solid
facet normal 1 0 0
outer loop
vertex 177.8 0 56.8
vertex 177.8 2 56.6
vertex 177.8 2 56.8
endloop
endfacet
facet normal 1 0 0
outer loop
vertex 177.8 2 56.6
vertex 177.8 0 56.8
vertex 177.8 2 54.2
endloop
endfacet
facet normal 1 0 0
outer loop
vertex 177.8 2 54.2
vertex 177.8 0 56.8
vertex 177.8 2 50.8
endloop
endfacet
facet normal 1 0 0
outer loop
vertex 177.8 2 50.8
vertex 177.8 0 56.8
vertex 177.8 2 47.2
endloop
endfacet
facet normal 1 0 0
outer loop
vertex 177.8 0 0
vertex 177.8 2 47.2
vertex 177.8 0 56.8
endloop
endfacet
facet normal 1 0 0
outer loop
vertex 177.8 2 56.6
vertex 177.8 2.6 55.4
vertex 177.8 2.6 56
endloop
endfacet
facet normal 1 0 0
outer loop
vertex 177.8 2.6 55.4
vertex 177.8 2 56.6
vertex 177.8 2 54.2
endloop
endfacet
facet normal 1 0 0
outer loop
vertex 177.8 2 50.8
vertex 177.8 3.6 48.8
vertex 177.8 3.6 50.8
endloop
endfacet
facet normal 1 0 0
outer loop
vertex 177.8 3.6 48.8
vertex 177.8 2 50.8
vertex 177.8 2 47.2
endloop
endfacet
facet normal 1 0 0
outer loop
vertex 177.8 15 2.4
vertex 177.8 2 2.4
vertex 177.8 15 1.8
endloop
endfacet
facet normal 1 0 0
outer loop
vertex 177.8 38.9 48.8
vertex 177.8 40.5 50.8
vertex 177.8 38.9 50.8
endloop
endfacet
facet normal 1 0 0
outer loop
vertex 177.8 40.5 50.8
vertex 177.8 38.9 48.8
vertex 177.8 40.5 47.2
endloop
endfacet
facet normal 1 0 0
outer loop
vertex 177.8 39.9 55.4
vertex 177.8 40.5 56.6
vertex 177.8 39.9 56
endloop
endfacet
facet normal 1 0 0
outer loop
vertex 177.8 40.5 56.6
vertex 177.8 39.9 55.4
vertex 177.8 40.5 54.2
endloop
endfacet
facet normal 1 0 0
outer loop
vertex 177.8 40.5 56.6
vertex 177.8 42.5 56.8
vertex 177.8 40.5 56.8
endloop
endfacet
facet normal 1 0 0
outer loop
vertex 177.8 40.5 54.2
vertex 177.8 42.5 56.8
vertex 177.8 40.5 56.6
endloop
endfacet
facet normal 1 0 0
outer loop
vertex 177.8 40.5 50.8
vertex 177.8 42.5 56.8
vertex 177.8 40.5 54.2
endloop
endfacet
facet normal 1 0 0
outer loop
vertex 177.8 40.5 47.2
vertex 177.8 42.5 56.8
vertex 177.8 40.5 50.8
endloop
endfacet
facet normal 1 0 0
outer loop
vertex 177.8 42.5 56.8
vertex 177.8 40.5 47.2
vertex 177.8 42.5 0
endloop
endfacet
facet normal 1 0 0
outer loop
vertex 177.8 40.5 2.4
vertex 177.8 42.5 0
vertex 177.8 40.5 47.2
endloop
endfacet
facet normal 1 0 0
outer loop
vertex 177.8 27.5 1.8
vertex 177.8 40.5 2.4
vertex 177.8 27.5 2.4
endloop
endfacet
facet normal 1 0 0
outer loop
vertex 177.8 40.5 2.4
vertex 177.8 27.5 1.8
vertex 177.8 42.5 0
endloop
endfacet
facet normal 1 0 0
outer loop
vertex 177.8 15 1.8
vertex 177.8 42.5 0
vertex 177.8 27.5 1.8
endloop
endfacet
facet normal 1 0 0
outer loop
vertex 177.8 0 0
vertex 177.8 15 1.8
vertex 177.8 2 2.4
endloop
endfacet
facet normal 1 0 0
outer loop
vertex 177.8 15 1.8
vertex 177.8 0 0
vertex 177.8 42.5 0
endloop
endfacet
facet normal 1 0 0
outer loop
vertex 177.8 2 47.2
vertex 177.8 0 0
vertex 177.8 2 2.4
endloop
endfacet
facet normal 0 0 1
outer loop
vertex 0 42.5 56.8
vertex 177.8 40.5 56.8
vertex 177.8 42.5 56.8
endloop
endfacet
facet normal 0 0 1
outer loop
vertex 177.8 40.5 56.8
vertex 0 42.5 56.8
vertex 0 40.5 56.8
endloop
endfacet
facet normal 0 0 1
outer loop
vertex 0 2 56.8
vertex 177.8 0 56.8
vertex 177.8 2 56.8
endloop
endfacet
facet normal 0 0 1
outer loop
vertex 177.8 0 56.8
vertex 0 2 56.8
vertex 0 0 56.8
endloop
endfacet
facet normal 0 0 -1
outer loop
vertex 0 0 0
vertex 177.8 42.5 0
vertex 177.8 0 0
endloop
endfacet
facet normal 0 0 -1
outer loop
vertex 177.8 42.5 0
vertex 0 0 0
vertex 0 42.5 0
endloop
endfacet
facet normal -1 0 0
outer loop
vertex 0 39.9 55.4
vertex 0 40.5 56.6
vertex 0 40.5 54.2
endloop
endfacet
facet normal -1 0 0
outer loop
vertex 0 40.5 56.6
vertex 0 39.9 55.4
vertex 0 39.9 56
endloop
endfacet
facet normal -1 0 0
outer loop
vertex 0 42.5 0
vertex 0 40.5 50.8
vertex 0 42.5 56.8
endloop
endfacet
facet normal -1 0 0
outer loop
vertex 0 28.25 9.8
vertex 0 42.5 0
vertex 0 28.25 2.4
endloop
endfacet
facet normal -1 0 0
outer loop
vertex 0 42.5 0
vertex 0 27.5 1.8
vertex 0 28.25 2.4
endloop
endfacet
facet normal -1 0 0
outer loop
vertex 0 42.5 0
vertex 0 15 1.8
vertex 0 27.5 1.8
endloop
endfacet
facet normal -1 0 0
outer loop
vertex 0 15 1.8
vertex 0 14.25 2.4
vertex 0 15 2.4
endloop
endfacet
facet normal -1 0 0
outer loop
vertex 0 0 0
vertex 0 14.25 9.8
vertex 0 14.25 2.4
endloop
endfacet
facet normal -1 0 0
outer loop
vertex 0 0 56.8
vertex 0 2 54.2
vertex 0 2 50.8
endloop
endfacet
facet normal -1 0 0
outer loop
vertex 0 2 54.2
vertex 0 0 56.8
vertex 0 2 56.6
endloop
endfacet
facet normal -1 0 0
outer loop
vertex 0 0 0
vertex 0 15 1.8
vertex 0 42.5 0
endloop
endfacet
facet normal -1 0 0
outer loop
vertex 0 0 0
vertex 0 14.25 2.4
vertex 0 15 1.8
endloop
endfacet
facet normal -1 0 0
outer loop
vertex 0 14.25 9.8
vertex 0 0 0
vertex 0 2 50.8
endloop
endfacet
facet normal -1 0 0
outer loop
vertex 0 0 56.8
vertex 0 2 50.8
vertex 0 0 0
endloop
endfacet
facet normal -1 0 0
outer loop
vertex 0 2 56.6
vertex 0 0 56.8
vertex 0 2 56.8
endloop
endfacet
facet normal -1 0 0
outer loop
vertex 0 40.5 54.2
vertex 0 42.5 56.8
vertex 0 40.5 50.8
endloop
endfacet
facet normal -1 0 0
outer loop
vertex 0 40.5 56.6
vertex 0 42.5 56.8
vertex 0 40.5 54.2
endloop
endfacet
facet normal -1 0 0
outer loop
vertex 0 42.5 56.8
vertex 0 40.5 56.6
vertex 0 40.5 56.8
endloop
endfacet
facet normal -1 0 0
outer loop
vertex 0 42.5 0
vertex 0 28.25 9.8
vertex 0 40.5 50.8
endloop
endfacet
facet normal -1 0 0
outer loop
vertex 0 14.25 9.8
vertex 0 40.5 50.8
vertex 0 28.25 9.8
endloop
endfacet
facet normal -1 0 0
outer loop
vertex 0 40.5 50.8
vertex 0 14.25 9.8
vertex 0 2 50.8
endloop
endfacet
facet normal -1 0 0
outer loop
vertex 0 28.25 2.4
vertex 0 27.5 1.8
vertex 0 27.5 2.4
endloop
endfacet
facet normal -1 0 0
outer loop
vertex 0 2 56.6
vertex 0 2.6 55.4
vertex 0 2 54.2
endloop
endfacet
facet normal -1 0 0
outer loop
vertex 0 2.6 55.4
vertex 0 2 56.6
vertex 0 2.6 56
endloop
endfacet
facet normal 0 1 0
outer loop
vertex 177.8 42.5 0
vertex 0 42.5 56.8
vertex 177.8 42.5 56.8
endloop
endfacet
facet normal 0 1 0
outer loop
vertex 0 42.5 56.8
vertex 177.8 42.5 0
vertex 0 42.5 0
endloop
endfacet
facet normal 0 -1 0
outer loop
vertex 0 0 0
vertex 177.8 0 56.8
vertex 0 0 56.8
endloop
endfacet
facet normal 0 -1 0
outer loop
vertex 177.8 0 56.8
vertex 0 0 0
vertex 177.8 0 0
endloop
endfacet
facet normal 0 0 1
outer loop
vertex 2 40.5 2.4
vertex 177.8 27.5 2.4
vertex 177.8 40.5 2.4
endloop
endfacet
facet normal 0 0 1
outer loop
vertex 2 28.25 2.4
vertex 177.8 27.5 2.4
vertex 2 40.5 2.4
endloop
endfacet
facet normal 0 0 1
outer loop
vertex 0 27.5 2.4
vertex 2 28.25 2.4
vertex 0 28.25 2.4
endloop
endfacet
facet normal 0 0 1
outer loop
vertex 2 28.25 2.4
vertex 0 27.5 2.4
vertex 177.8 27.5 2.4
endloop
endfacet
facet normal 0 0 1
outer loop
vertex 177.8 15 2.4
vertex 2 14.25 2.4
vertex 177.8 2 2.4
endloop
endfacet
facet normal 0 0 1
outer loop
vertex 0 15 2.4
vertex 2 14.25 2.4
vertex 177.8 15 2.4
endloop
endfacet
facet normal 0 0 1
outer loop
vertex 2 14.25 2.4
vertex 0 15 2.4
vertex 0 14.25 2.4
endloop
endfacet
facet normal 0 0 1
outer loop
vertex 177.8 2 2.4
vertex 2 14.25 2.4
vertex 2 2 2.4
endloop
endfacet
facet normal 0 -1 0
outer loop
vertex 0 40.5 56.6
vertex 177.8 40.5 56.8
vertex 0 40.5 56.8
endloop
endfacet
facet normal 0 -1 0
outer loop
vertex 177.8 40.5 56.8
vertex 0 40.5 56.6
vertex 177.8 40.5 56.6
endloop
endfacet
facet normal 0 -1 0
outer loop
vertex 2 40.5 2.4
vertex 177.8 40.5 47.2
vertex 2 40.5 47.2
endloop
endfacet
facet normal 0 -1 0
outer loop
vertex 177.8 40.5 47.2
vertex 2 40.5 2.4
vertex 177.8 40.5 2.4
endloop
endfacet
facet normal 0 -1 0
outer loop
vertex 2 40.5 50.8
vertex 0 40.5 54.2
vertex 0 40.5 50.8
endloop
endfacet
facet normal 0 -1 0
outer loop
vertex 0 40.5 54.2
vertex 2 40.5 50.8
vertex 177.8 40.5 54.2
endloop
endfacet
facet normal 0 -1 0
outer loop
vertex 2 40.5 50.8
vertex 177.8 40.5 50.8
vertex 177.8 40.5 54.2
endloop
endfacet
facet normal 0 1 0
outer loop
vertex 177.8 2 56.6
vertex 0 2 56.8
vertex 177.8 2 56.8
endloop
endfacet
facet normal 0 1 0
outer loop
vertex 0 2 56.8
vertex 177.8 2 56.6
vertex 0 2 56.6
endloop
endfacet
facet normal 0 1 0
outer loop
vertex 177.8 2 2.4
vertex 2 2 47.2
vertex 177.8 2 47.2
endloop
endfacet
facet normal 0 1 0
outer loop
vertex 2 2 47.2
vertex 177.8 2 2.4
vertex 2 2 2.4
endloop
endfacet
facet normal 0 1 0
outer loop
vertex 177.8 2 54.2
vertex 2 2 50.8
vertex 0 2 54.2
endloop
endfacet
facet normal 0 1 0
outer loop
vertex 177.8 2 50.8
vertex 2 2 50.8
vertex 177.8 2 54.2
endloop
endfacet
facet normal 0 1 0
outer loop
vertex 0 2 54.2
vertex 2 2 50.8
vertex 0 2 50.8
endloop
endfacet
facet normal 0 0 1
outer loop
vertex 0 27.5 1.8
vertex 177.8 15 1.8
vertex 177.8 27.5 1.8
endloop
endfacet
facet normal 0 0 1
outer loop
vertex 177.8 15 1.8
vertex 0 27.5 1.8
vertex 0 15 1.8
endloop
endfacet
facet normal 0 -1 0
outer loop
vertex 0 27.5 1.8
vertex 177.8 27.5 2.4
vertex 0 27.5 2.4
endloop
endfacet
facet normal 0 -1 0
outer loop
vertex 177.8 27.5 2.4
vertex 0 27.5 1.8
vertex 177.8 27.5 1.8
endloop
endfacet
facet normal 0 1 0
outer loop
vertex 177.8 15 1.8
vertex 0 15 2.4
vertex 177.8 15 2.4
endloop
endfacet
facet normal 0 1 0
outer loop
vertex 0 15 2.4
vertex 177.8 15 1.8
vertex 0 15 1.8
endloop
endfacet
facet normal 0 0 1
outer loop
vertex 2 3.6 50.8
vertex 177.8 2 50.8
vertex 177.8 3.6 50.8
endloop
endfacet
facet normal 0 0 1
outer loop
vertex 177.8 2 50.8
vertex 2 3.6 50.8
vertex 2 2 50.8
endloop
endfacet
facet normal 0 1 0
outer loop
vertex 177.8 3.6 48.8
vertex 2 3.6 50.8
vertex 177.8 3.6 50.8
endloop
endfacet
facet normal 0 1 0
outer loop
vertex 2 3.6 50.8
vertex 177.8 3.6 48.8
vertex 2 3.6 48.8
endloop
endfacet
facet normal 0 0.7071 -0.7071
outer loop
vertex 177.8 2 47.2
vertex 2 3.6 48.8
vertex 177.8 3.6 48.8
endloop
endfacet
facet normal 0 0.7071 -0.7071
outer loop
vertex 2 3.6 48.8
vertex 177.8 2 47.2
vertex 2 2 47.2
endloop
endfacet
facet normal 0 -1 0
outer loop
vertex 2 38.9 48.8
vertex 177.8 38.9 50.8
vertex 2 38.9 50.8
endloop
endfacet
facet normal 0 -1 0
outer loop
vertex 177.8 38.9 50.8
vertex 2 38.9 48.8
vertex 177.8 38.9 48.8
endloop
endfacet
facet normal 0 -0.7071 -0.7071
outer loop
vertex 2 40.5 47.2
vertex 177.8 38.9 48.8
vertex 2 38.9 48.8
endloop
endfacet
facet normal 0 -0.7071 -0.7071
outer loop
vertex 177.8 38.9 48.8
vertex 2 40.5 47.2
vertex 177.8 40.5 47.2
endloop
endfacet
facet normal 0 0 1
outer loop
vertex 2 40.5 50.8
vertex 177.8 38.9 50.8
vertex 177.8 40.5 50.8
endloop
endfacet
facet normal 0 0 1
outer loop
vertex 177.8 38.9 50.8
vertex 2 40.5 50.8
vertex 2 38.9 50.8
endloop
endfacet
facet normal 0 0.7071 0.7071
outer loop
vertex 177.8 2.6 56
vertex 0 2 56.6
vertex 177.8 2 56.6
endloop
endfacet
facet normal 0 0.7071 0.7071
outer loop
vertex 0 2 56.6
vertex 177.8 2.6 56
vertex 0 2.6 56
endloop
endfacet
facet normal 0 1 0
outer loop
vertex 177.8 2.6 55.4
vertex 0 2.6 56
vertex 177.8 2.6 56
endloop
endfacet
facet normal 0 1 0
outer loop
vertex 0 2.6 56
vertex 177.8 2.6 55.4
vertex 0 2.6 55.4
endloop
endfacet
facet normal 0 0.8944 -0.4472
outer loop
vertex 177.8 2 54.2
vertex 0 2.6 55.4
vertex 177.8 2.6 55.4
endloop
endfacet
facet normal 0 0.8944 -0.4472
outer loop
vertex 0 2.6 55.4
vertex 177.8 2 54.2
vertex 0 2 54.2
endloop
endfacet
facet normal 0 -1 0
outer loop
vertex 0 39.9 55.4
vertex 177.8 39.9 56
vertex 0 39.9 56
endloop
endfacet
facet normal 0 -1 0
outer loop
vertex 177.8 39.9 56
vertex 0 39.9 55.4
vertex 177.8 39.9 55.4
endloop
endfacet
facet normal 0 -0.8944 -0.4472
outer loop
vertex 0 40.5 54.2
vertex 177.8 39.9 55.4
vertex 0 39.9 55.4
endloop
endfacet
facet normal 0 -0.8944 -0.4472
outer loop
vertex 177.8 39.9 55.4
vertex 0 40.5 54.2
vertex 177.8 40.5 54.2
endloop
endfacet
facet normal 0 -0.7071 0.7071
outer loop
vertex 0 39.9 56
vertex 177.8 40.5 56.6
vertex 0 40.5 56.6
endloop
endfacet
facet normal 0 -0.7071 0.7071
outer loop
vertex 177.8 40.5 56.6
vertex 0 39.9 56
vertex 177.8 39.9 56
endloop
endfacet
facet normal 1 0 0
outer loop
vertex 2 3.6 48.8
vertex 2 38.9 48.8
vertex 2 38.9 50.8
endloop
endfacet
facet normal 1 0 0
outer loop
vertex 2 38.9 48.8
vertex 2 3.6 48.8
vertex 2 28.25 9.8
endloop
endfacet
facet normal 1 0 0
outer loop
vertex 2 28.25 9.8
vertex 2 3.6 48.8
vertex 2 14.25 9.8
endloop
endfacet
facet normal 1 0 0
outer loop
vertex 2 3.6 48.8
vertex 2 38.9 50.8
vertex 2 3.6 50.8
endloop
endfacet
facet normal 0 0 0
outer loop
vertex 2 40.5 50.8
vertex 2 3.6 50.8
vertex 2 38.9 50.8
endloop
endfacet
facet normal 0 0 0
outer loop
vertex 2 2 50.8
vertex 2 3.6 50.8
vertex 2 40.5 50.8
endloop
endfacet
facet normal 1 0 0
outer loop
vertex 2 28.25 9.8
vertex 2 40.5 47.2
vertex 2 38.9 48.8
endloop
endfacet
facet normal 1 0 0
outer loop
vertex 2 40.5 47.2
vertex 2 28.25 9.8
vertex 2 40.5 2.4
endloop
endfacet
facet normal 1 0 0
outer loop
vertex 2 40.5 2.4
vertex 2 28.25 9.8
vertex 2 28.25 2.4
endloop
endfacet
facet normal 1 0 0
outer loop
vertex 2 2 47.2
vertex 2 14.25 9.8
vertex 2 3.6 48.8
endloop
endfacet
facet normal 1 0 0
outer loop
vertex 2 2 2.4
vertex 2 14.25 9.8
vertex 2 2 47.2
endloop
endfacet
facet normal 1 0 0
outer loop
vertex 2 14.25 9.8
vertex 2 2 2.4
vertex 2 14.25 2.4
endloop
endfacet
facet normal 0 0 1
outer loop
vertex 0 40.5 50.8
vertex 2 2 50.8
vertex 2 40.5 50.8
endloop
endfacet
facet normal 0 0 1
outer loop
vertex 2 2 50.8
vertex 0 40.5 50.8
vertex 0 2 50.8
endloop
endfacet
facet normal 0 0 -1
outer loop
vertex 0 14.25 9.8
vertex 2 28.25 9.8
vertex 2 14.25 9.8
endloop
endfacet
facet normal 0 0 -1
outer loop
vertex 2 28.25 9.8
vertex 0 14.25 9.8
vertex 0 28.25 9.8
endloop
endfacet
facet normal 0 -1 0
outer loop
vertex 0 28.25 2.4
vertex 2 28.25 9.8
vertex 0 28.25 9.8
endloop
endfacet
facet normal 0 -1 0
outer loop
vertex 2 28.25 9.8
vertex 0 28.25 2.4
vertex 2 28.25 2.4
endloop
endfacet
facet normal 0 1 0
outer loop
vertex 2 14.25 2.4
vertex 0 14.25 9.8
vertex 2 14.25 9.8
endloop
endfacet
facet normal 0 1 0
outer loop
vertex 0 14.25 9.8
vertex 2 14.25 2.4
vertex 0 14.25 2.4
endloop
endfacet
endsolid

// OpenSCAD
// Glass light box: a printed trough that clips onto the BACK of the original
// Seeburg title-strip panel, behind one strip of coloured glass (one above the
// selection numbers, one below). A 5 V LED strip is taped to the floor of the
// box and shines through the glass from about 2" away, so the light spreads out
// like the old tube lighting instead of showing hot dots.
//
//   floor (strip taped here)                open face (toward the glass)
//   ________________________________        _______
//   |                              |       |       |  <- skirt hugs the
//   |  ==== LED strip ====         |  ...  |       |     panel's two walls
//
// Cross-section (looking along the box):
//
//        skirt |       |  skirt      <- slides over the outside of the
//              |_     _|               side channel's two walls
//              | \   / |  <- ledge: the channel walls stop here
//              |       |
//              |       |  <- 2" of depth for the light to spread
//              |_[==]_|  <- LED strip on the floor, in a shallow guide
//
// Print orientation: FLOOR DOWN, open side up. No supports.
// White or natural PLA/PETG reflects the most light.
//
//   part = "fittest" -> 40 mm long, short walls: checks the clip fit (print first)
//   part = "half1"   -> first half (wire slot in the outer end)
//   part = "half2"   -> second half (wire slot in the outer end)
//   part = "sleeve"  -> clip that slides over the joint (print 1 per box)
//   part = "box"     -> both halves together, for a preview

part = "half1";

// ---- sizes in mm (inches in comments) ----
BOX_L    = 355.6;   // 14" total length (two halves of 177.8)
CH_OUT   = 38.1;    // 1.5": outside width of the panel's side channel (wall to wall,
                    //   outside faces). This is the size the skirt hugs. MEASURE.
FIT      = 0.4;     // extra gap so the skirt slides on
WALL     = 2.0;     // side wall thickness (thin enough for the skirt to flex)
FLOOR    = 2.4;     // floor thickness
DEPTH    = 50.8;    // 2": floor bottom to where the panel's walls stop (the ledge)
SKIRT    = 6;       // how far the skirt reaches over the panel's walls
RIDGE    = 0.6;     // grip ridge inside each skirt tip
LEDGE    = 1.6;     // how far the stop ledge sticks in from each wall
LEDGE_H  = 2;       // ledge height (with a 45 degree chamfer underneath)

STRIP_W  = 12.5;    // LED strip guide width (10 mm strips + room; 12 mm strips fit)
STRIP_D  = 0.6;     // guide depth (flat bottom, tape still sits flat)
SLOT_W   = 14;      // wire slot in the outer end wall, width
SLOT_H   = 8;       // wire slot height above the floor

SLEEVE_L = 40;      // joint sleeve length
SLEEVE_T = 1.6;     // sleeve wall thickness
SLEEVE_FIT = 0.25;  // gap between sleeve and box

FIT_L    = 40;      // fit test length
FIT_H    = 14;      // fit test height below the ledge

// ---- derived ----
IN_W   = CH_OUT + FIT;          // inside width at the skirt
OUT_W  = IN_W + 2*WALL;         // outside width of the box
HALF_L = BOX_L / 2;
TOTAL_H = DEPTH + SKIRT;

$fn = 48;

// The basic trough: floor, two long walls, ledge and skirt. Open ends.
// depth = floor bottom to the ledge, length along X.
module trough(len, depth) {
  difference() {
    cube([len, OUT_W, depth + SKIRT]);
    // inside space
    translate([-1, WALL, FLOOR]) cube([len + 2, IN_W, depth + SKIRT]);
    // LED strip guide in the floor
    translate([-1, (OUT_W - STRIP_W)/2, FLOOR - STRIP_D]) cube([len + 2, STRIP_W, STRIP_D + 0.01]);
  }
  // stop ledges (the panel's walls butt against these), chamfered underneath
  for (side = [0, 1]) {
    y0 = side == 0 ? WALL : WALL + IN_W;
    dir = side == 0 ? 1 : -1;
    translate([0, y0, 0])
      rotate([90, 0, 90])
        linear_extrude(len)
          polygon([[0, depth - LEDGE_H - LEDGE], [dir*LEDGE, depth - LEDGE_H],
                   [dir*LEDGE, depth], [0, depth]]);
  }
  // grip ridges at the skirt tips (chamfered both ways so they print and slide)
  for (side = [0, 1]) {
    y0 = side == 0 ? WALL : WALL + IN_W;
    dir = side == 0 ? 1 : -1;
    translate([0, y0, 0])
      rotate([90, 0, 90])
        linear_extrude(len)
          polygon([[0, depth + SKIRT - 3*RIDGE - 0.8], [dir*RIDGE, depth + SKIRT - 0.8 - RIDGE],
                   [dir*RIDGE, depth + SKIRT - 0.8], [0, depth + SKIRT - 0.2]]);
  }
}

// End wall up to the ledge (the skirt part stays open so it can pass the
// panel's own end walls). slot = wire slot at the floor.
module end_wall(x, slot) {
  translate([x, 0, 0])
    difference() {
      cube([WALL, OUT_W, DEPTH]);
      if (slot)
        translate([-1, (OUT_W - SLOT_W)/2, FLOOR - STRIP_D]) cube([WALL + 2, SLOT_W, SLOT_H]);
    }
}

module half(outer_end_at_zero) {
  trough(HALF_L, DEPTH);
  end_wall(outer_end_at_zero ? 0 : HALF_L - WALL, true);
}

module sleeve() {
  // U-shaped clip that slides over the outside of the joint, up to the ledge
  // height. Glue the halves end to end, then slide this over the joint.
  w = OUT_W + 2*SLEEVE_FIT;
  h = DEPTH - 4;   // stays below the skirt so it doesn't stop the skirt flexing
  difference() {
    cube([SLEEVE_L, w + 2*SLEEVE_T, h + SLEEVE_T]);
    translate([-1, SLEEVE_T, SLEEVE_T]) cube([SLEEVE_L + 2, w, h + 1]);
  }
}

module fittest() {
  trough(FIT_L, FIT_H);
}

if (part == "half1") half(true);
else if (part == "half2") half(false);
else if (part == "sleeve") sleeve();
else if (part == "fittest") fittest();
else if (part == "box") {
  color("white") half(true);
  color("white") translate([HALF_L, 0, 0]) half(false);
  color("grey") translate([HALF_L - SLEEVE_L/2, -SLEEVE_T - SLEEVE_FIT, -SLEEVE_T]) sleeve();
}
